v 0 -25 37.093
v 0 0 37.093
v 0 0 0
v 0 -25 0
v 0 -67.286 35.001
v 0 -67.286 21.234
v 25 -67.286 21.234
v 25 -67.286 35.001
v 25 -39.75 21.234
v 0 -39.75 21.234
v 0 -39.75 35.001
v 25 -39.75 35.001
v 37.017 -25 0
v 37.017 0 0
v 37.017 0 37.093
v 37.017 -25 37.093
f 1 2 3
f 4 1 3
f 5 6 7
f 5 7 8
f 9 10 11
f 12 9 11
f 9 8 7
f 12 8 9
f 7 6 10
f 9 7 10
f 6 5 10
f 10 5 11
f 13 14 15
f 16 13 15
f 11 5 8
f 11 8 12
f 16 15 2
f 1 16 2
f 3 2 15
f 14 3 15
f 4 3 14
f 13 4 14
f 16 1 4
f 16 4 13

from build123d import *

# Parameters (mm, degrees)
F1_DEPTH = 25
F2_W     = 27.5361537933
F2_H     = 13.7671530247
F3_DEPTH = 25


# Not quite as in the source:
# - a feature names something its author has since deleted; it is built from what else it names


with BuildPart() as f1:
    # F0 (on Front) → F1 (new body)
    with BuildSketch(Plane.XZ):
        Polygon((37.0171777904, 0), (37.0171777904, 37.0931364596), (0, 37.0931364596), (0, 18.5465682298), (0, 0), align=None)
    extrude(amount=F1_DEPTH)


with BuildPart() as f3:
    # F2 (on Right) → F3 (new body)
    with BuildSketch(Plane.YZ):
        with Locations((-53.5176098347, 28.1172171235)):
            Rectangle(F2_W, F2_H)
    extrude(amount=F3_DEPTH)


solid = Compound([f1.part, f3.part])
